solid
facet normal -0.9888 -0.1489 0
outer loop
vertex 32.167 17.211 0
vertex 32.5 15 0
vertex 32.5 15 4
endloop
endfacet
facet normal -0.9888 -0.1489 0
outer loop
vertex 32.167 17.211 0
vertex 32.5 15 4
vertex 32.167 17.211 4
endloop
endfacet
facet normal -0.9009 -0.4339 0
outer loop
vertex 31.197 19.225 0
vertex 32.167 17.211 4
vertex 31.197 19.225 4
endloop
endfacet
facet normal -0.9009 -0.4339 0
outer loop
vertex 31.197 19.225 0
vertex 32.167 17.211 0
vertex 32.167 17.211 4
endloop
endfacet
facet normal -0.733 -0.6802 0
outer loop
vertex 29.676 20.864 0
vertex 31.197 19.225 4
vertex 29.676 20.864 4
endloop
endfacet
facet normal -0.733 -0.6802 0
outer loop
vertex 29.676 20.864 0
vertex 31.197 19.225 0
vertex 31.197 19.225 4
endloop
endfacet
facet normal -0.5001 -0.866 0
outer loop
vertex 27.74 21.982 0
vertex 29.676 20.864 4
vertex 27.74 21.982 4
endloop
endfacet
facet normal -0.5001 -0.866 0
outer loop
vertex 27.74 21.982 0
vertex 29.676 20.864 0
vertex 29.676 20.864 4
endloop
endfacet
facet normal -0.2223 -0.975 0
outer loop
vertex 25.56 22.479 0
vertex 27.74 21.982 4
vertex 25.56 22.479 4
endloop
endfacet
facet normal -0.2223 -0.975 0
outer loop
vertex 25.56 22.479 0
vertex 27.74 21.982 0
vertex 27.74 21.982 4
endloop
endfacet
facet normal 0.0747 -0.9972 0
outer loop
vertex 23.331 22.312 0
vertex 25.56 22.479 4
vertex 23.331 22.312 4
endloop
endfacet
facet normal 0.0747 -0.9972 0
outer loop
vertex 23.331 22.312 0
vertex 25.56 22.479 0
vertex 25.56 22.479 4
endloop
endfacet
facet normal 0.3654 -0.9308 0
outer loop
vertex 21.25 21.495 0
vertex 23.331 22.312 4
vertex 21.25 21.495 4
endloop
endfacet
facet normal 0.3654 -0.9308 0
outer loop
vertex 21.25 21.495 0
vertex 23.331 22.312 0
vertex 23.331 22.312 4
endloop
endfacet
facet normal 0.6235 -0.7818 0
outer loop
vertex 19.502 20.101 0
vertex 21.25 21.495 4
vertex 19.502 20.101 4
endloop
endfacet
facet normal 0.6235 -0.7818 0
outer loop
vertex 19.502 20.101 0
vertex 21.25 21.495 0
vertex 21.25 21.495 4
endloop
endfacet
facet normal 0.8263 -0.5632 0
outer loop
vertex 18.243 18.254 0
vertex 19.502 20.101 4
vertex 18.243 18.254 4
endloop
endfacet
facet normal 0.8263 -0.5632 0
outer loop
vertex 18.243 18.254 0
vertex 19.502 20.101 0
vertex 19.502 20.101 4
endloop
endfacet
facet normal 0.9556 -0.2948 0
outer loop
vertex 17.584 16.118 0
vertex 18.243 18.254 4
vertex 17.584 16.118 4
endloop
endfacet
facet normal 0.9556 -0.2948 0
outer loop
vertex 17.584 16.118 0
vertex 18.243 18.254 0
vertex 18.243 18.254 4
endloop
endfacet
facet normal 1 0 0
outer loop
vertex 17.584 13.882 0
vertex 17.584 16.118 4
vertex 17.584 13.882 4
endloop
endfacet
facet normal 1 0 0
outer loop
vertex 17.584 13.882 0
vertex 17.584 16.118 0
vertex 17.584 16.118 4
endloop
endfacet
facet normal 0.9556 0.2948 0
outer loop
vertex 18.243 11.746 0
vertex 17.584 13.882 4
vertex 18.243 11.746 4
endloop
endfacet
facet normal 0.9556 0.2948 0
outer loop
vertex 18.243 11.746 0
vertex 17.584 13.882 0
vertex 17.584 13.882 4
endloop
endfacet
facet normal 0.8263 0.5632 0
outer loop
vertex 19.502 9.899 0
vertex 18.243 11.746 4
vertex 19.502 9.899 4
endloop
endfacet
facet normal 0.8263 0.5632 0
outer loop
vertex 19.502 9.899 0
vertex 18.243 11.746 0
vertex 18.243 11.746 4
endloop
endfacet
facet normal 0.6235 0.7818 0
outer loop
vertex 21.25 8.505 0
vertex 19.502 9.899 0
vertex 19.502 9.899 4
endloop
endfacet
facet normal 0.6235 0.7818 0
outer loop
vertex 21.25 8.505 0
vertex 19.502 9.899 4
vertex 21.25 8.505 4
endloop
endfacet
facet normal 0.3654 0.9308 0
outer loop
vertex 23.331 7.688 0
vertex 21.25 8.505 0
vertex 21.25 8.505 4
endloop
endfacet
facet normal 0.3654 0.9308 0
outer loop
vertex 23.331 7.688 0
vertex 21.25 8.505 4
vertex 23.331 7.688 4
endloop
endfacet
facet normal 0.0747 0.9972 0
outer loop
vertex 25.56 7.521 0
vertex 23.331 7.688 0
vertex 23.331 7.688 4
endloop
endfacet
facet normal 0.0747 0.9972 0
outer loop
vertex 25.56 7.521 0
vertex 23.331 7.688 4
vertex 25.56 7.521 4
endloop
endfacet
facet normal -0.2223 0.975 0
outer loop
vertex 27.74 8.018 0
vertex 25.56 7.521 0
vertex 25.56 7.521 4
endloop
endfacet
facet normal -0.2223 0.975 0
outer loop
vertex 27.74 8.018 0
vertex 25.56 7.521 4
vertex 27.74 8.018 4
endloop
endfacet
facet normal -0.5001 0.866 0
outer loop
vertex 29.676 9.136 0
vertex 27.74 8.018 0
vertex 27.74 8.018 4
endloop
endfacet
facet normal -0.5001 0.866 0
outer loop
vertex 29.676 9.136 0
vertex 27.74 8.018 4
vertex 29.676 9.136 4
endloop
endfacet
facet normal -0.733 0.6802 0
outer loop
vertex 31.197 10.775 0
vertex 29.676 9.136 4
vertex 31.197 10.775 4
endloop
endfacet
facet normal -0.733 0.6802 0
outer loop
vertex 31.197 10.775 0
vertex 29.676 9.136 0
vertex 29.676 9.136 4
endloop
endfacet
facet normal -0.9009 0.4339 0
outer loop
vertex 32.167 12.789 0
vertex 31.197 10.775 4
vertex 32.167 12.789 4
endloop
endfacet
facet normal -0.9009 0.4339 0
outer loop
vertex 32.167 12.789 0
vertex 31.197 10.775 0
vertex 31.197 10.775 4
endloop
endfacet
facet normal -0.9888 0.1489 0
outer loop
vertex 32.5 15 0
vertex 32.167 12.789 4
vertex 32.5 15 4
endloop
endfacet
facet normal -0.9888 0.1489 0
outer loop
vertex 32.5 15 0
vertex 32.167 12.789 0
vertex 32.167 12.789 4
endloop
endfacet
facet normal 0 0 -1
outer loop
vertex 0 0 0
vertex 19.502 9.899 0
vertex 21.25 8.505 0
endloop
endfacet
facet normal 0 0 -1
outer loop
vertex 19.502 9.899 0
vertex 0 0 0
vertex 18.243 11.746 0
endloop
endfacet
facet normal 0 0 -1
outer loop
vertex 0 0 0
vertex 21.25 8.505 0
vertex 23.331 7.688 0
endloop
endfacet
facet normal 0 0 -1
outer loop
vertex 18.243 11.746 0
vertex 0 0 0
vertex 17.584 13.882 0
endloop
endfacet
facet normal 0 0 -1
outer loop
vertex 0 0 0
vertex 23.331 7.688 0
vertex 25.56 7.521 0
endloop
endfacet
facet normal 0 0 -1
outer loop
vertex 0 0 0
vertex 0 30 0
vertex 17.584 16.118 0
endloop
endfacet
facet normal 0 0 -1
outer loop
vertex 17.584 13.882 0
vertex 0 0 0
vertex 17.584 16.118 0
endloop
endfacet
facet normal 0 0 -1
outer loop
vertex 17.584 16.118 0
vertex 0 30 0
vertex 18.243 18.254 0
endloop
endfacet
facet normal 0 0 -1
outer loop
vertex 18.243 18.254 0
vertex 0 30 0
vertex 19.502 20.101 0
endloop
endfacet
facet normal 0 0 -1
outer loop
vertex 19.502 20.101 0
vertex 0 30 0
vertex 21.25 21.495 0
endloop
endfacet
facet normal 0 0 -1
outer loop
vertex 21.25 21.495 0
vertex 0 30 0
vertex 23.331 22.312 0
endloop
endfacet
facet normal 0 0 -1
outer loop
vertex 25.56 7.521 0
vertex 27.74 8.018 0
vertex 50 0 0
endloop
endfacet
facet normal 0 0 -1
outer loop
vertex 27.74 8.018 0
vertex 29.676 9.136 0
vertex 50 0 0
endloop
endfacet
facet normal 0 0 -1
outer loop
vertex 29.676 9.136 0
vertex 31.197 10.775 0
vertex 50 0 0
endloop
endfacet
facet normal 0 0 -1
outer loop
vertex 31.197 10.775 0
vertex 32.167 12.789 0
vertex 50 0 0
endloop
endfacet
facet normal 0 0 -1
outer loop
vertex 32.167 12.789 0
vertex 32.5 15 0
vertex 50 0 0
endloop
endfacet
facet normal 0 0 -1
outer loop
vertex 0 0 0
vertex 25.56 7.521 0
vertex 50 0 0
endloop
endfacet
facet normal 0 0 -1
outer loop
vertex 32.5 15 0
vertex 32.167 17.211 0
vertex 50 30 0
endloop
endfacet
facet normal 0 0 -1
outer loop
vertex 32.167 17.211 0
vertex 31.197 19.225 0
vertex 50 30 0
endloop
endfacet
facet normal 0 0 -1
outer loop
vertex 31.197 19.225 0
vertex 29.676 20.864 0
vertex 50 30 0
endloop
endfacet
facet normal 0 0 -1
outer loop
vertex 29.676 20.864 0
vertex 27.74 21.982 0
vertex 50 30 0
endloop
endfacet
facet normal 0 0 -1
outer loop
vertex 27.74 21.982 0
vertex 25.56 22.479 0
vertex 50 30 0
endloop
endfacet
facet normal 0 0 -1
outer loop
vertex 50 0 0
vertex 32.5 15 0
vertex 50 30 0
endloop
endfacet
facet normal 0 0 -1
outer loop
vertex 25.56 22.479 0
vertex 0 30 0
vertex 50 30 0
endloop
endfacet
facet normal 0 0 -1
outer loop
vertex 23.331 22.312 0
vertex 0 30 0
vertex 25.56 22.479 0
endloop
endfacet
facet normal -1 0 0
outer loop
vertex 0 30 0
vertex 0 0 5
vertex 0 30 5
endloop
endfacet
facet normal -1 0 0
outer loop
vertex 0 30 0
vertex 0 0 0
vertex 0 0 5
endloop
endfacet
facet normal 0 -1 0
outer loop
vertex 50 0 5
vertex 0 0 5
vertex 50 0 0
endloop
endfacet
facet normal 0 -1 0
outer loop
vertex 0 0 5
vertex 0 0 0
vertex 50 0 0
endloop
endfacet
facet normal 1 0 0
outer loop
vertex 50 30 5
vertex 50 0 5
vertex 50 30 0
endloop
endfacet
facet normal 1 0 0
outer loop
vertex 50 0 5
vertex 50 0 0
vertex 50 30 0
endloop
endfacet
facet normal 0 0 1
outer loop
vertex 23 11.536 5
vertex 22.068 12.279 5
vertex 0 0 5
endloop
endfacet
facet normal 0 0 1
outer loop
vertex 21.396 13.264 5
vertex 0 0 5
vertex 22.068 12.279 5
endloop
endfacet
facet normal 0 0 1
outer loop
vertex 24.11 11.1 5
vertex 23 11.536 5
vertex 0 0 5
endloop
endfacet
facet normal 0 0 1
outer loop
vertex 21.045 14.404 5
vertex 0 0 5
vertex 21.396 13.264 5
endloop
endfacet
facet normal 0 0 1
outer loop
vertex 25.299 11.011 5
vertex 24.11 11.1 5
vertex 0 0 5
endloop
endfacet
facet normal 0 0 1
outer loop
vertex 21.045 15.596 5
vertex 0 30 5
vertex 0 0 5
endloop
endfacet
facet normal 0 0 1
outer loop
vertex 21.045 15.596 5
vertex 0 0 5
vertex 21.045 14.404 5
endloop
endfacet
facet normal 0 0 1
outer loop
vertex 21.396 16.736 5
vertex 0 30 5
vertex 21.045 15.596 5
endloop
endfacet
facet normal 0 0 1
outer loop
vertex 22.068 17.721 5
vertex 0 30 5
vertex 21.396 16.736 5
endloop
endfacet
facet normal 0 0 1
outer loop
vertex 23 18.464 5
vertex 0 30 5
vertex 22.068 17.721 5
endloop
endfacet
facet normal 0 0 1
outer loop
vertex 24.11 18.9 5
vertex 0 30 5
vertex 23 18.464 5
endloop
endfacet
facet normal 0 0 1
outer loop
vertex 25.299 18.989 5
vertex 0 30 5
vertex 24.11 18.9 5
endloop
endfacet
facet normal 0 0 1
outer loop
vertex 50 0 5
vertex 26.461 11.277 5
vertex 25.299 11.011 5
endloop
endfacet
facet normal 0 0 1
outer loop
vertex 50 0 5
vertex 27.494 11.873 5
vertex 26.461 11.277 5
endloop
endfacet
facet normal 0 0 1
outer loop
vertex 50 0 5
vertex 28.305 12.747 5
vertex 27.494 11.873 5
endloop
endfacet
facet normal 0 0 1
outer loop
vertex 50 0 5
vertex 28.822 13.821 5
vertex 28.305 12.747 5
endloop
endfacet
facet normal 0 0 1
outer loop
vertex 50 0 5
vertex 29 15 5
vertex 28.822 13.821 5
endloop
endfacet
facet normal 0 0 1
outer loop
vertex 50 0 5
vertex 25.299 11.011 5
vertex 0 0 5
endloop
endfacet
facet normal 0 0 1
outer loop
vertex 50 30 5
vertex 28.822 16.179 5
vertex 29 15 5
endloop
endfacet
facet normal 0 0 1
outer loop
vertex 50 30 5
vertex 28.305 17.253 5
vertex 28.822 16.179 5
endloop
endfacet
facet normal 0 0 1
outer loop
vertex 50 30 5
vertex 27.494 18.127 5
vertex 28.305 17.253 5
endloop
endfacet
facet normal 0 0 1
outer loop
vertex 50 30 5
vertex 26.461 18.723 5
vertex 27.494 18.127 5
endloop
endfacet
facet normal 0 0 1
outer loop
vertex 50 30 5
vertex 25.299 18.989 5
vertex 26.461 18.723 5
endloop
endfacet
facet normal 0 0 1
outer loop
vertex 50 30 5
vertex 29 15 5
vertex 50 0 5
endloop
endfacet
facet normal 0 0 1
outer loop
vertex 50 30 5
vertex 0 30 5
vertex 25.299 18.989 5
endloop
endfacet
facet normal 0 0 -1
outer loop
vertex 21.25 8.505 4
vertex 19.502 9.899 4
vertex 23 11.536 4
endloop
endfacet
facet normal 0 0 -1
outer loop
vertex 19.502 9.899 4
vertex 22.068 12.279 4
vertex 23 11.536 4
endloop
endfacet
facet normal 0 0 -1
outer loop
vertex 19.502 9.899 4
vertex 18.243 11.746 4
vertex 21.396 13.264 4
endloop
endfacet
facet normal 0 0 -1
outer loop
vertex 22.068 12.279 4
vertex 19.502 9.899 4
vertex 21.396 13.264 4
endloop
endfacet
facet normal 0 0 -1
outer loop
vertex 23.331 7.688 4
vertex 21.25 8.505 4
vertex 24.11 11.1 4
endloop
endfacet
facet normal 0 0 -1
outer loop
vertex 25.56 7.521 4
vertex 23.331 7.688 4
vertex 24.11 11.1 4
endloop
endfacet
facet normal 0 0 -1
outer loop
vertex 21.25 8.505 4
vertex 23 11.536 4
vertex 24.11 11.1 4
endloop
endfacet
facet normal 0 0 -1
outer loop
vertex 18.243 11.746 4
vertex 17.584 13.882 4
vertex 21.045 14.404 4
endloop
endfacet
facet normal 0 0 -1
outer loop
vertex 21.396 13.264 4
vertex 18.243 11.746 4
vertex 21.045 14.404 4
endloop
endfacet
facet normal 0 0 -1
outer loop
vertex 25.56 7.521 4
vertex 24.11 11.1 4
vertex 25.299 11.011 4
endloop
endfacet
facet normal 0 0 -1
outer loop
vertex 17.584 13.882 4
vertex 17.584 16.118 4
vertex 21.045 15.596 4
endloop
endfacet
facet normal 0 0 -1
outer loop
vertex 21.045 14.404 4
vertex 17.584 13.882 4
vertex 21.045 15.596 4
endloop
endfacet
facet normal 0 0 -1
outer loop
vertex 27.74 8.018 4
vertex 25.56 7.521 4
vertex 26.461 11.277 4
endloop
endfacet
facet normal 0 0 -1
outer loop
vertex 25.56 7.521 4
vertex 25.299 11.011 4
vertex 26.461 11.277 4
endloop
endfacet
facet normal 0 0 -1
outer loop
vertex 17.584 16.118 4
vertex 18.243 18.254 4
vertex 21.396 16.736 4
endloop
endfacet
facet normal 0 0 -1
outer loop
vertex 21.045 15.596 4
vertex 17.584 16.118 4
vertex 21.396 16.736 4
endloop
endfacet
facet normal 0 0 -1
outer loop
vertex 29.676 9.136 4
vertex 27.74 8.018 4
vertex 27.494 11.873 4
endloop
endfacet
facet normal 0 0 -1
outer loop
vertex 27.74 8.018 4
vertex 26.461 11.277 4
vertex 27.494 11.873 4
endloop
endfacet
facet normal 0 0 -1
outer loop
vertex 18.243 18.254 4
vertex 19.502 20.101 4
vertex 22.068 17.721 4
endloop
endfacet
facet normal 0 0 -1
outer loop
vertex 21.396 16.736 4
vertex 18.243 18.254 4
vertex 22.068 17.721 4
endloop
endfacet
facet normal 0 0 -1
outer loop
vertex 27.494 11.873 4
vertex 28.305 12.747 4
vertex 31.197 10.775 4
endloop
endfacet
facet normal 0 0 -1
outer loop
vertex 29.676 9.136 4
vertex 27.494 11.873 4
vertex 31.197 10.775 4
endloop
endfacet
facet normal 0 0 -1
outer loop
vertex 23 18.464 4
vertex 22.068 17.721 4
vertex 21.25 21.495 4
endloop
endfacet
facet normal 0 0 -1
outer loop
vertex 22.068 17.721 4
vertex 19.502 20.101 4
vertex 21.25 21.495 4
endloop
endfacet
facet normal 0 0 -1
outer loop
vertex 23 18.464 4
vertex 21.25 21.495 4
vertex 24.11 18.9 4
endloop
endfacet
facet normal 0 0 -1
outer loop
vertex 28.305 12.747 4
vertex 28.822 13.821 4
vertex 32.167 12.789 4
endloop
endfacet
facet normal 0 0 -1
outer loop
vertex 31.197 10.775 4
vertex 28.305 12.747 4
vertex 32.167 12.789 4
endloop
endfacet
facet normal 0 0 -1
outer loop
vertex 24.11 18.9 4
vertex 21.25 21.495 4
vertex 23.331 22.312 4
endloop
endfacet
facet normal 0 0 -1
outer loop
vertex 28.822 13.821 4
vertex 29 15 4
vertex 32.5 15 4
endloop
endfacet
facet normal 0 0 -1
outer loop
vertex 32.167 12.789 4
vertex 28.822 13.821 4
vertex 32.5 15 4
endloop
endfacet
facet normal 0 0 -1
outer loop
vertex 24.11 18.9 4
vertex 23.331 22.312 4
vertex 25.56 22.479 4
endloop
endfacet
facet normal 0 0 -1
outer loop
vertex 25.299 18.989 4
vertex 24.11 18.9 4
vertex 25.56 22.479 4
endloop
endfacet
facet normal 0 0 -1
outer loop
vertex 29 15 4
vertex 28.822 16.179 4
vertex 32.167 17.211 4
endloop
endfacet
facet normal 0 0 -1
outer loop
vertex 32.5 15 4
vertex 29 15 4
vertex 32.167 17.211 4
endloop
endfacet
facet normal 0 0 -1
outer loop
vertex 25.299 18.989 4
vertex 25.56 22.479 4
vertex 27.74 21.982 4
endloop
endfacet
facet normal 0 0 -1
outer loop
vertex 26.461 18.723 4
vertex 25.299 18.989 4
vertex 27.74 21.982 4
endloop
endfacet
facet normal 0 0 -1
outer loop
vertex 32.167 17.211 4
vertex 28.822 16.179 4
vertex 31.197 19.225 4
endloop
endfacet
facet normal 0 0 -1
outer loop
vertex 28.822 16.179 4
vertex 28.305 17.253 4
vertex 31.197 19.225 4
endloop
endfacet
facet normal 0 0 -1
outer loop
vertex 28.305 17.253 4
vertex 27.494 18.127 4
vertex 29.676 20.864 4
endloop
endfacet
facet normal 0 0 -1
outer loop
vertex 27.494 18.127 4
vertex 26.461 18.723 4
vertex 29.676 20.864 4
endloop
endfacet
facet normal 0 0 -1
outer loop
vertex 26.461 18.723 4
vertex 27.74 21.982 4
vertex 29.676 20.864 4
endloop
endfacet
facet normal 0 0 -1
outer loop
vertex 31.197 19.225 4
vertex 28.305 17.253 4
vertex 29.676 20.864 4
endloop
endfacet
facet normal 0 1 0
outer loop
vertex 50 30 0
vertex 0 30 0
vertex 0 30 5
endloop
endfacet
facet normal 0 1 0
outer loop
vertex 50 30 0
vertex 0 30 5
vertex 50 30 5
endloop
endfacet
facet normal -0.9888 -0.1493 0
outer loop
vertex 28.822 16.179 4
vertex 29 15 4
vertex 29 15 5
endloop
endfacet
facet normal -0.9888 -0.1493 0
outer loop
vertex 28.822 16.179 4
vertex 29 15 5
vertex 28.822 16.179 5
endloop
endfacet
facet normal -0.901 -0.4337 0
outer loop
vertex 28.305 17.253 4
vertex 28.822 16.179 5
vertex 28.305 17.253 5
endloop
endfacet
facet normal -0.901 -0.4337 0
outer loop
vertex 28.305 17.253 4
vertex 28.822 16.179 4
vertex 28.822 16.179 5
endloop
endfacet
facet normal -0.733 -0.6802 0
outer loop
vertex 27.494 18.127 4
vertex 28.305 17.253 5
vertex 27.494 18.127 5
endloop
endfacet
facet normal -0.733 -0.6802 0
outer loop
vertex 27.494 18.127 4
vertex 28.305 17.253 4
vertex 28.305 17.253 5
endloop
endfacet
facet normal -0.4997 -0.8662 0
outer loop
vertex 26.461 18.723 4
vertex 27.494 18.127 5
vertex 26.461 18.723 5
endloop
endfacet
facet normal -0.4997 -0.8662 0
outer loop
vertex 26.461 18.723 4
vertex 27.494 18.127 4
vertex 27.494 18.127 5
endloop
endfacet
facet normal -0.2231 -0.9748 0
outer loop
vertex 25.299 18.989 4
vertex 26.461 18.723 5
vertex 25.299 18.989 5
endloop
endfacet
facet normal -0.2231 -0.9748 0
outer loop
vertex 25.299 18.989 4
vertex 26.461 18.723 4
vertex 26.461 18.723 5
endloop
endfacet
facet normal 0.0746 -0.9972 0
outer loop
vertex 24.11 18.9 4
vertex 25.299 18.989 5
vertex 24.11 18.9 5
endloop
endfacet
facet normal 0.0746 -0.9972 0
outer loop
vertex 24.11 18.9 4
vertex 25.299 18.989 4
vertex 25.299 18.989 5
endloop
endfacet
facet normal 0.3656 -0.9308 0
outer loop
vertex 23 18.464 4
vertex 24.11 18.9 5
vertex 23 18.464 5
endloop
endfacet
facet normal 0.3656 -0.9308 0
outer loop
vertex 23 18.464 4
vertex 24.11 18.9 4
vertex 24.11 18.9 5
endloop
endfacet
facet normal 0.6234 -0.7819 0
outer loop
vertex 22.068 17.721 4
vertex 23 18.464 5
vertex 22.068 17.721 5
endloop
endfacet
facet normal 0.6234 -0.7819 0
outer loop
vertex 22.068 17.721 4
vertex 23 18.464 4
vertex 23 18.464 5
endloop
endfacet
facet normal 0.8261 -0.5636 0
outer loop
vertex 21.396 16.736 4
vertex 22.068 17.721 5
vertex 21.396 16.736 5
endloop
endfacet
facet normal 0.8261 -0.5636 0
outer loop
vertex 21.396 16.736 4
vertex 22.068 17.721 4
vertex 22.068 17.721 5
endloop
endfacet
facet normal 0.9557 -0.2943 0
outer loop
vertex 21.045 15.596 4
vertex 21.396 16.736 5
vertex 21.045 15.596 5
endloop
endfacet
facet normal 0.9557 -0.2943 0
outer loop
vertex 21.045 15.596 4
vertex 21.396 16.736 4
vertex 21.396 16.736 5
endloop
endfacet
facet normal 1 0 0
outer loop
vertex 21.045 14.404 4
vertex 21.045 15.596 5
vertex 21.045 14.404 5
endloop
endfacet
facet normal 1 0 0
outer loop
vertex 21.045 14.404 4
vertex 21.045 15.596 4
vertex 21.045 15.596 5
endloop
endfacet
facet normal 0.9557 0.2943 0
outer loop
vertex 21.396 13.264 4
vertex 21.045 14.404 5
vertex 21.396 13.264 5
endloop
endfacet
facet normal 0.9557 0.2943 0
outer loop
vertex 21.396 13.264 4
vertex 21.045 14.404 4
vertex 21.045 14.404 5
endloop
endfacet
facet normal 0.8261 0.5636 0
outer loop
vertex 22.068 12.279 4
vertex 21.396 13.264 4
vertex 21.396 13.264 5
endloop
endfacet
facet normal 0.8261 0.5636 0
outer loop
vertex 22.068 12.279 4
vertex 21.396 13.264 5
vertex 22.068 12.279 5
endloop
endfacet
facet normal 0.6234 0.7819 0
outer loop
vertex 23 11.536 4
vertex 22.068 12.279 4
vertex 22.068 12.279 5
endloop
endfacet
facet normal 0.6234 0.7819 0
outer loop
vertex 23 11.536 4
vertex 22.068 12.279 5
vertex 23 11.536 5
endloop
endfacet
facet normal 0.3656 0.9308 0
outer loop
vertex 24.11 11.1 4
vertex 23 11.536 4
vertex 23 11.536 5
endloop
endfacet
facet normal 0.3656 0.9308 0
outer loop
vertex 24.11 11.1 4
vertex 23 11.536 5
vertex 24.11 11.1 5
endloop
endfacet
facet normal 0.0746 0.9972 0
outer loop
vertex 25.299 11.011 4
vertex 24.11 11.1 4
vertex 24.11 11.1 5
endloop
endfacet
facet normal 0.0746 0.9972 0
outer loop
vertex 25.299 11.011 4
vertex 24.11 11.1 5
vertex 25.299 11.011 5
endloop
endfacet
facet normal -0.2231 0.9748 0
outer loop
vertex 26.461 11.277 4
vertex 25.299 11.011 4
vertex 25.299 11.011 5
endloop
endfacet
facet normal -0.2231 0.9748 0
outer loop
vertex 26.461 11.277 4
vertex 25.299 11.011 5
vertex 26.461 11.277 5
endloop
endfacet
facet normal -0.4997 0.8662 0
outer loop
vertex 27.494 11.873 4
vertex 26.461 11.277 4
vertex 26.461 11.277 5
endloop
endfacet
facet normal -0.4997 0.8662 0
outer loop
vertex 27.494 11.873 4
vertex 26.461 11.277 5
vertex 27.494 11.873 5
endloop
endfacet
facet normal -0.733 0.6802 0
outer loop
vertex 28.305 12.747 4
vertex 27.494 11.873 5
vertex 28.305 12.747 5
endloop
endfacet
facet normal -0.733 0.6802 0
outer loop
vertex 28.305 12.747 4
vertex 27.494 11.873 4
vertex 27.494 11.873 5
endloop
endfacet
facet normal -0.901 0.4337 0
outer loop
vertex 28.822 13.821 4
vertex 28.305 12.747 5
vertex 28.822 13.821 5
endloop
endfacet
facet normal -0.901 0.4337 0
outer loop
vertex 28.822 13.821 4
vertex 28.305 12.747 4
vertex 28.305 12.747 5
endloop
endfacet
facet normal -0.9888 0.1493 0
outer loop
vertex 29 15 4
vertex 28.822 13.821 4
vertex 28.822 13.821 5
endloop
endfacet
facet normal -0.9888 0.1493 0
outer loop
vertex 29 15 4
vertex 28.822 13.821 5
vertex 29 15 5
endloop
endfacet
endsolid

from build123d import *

# Parameters (mm, degrees)
SKETCH_W     = 50
SKETCH_H     = 30
SKETCH_R     = 7.5
PAD_DEPTH    = 4
SKETCH001_W  = 50
SKETCH001_H  = 30
SKETCH001_R  = 4
PAD001_DEPTH = 1


with BuildPart() as part:
    # Sketch → Pad (new body)
    with BuildSketch(Plane.XY):
        with Locations((25, 15)):
            Rectangle(SKETCH_W, SKETCH_H)
        with Locations((25, 15)):
            Circle(SKETCH_R, mode=Mode.SUBTRACT)
    extrude(amount=PAD_DEPTH)

    # Sketch001 (on Face7 of Pad) → Pad001 (join)
    with BuildSketch(Plane.XY.offset(4)):
        with Locations((25, 15)):
            Rectangle(SKETCH001_W, SKETCH001_H)
        with Locations((25, 15)):
            Circle(SKETCH001_R, mode=Mode.SUBTRACT)
    extrude(amount=PAD001_DEPTH)


solid = part.part
